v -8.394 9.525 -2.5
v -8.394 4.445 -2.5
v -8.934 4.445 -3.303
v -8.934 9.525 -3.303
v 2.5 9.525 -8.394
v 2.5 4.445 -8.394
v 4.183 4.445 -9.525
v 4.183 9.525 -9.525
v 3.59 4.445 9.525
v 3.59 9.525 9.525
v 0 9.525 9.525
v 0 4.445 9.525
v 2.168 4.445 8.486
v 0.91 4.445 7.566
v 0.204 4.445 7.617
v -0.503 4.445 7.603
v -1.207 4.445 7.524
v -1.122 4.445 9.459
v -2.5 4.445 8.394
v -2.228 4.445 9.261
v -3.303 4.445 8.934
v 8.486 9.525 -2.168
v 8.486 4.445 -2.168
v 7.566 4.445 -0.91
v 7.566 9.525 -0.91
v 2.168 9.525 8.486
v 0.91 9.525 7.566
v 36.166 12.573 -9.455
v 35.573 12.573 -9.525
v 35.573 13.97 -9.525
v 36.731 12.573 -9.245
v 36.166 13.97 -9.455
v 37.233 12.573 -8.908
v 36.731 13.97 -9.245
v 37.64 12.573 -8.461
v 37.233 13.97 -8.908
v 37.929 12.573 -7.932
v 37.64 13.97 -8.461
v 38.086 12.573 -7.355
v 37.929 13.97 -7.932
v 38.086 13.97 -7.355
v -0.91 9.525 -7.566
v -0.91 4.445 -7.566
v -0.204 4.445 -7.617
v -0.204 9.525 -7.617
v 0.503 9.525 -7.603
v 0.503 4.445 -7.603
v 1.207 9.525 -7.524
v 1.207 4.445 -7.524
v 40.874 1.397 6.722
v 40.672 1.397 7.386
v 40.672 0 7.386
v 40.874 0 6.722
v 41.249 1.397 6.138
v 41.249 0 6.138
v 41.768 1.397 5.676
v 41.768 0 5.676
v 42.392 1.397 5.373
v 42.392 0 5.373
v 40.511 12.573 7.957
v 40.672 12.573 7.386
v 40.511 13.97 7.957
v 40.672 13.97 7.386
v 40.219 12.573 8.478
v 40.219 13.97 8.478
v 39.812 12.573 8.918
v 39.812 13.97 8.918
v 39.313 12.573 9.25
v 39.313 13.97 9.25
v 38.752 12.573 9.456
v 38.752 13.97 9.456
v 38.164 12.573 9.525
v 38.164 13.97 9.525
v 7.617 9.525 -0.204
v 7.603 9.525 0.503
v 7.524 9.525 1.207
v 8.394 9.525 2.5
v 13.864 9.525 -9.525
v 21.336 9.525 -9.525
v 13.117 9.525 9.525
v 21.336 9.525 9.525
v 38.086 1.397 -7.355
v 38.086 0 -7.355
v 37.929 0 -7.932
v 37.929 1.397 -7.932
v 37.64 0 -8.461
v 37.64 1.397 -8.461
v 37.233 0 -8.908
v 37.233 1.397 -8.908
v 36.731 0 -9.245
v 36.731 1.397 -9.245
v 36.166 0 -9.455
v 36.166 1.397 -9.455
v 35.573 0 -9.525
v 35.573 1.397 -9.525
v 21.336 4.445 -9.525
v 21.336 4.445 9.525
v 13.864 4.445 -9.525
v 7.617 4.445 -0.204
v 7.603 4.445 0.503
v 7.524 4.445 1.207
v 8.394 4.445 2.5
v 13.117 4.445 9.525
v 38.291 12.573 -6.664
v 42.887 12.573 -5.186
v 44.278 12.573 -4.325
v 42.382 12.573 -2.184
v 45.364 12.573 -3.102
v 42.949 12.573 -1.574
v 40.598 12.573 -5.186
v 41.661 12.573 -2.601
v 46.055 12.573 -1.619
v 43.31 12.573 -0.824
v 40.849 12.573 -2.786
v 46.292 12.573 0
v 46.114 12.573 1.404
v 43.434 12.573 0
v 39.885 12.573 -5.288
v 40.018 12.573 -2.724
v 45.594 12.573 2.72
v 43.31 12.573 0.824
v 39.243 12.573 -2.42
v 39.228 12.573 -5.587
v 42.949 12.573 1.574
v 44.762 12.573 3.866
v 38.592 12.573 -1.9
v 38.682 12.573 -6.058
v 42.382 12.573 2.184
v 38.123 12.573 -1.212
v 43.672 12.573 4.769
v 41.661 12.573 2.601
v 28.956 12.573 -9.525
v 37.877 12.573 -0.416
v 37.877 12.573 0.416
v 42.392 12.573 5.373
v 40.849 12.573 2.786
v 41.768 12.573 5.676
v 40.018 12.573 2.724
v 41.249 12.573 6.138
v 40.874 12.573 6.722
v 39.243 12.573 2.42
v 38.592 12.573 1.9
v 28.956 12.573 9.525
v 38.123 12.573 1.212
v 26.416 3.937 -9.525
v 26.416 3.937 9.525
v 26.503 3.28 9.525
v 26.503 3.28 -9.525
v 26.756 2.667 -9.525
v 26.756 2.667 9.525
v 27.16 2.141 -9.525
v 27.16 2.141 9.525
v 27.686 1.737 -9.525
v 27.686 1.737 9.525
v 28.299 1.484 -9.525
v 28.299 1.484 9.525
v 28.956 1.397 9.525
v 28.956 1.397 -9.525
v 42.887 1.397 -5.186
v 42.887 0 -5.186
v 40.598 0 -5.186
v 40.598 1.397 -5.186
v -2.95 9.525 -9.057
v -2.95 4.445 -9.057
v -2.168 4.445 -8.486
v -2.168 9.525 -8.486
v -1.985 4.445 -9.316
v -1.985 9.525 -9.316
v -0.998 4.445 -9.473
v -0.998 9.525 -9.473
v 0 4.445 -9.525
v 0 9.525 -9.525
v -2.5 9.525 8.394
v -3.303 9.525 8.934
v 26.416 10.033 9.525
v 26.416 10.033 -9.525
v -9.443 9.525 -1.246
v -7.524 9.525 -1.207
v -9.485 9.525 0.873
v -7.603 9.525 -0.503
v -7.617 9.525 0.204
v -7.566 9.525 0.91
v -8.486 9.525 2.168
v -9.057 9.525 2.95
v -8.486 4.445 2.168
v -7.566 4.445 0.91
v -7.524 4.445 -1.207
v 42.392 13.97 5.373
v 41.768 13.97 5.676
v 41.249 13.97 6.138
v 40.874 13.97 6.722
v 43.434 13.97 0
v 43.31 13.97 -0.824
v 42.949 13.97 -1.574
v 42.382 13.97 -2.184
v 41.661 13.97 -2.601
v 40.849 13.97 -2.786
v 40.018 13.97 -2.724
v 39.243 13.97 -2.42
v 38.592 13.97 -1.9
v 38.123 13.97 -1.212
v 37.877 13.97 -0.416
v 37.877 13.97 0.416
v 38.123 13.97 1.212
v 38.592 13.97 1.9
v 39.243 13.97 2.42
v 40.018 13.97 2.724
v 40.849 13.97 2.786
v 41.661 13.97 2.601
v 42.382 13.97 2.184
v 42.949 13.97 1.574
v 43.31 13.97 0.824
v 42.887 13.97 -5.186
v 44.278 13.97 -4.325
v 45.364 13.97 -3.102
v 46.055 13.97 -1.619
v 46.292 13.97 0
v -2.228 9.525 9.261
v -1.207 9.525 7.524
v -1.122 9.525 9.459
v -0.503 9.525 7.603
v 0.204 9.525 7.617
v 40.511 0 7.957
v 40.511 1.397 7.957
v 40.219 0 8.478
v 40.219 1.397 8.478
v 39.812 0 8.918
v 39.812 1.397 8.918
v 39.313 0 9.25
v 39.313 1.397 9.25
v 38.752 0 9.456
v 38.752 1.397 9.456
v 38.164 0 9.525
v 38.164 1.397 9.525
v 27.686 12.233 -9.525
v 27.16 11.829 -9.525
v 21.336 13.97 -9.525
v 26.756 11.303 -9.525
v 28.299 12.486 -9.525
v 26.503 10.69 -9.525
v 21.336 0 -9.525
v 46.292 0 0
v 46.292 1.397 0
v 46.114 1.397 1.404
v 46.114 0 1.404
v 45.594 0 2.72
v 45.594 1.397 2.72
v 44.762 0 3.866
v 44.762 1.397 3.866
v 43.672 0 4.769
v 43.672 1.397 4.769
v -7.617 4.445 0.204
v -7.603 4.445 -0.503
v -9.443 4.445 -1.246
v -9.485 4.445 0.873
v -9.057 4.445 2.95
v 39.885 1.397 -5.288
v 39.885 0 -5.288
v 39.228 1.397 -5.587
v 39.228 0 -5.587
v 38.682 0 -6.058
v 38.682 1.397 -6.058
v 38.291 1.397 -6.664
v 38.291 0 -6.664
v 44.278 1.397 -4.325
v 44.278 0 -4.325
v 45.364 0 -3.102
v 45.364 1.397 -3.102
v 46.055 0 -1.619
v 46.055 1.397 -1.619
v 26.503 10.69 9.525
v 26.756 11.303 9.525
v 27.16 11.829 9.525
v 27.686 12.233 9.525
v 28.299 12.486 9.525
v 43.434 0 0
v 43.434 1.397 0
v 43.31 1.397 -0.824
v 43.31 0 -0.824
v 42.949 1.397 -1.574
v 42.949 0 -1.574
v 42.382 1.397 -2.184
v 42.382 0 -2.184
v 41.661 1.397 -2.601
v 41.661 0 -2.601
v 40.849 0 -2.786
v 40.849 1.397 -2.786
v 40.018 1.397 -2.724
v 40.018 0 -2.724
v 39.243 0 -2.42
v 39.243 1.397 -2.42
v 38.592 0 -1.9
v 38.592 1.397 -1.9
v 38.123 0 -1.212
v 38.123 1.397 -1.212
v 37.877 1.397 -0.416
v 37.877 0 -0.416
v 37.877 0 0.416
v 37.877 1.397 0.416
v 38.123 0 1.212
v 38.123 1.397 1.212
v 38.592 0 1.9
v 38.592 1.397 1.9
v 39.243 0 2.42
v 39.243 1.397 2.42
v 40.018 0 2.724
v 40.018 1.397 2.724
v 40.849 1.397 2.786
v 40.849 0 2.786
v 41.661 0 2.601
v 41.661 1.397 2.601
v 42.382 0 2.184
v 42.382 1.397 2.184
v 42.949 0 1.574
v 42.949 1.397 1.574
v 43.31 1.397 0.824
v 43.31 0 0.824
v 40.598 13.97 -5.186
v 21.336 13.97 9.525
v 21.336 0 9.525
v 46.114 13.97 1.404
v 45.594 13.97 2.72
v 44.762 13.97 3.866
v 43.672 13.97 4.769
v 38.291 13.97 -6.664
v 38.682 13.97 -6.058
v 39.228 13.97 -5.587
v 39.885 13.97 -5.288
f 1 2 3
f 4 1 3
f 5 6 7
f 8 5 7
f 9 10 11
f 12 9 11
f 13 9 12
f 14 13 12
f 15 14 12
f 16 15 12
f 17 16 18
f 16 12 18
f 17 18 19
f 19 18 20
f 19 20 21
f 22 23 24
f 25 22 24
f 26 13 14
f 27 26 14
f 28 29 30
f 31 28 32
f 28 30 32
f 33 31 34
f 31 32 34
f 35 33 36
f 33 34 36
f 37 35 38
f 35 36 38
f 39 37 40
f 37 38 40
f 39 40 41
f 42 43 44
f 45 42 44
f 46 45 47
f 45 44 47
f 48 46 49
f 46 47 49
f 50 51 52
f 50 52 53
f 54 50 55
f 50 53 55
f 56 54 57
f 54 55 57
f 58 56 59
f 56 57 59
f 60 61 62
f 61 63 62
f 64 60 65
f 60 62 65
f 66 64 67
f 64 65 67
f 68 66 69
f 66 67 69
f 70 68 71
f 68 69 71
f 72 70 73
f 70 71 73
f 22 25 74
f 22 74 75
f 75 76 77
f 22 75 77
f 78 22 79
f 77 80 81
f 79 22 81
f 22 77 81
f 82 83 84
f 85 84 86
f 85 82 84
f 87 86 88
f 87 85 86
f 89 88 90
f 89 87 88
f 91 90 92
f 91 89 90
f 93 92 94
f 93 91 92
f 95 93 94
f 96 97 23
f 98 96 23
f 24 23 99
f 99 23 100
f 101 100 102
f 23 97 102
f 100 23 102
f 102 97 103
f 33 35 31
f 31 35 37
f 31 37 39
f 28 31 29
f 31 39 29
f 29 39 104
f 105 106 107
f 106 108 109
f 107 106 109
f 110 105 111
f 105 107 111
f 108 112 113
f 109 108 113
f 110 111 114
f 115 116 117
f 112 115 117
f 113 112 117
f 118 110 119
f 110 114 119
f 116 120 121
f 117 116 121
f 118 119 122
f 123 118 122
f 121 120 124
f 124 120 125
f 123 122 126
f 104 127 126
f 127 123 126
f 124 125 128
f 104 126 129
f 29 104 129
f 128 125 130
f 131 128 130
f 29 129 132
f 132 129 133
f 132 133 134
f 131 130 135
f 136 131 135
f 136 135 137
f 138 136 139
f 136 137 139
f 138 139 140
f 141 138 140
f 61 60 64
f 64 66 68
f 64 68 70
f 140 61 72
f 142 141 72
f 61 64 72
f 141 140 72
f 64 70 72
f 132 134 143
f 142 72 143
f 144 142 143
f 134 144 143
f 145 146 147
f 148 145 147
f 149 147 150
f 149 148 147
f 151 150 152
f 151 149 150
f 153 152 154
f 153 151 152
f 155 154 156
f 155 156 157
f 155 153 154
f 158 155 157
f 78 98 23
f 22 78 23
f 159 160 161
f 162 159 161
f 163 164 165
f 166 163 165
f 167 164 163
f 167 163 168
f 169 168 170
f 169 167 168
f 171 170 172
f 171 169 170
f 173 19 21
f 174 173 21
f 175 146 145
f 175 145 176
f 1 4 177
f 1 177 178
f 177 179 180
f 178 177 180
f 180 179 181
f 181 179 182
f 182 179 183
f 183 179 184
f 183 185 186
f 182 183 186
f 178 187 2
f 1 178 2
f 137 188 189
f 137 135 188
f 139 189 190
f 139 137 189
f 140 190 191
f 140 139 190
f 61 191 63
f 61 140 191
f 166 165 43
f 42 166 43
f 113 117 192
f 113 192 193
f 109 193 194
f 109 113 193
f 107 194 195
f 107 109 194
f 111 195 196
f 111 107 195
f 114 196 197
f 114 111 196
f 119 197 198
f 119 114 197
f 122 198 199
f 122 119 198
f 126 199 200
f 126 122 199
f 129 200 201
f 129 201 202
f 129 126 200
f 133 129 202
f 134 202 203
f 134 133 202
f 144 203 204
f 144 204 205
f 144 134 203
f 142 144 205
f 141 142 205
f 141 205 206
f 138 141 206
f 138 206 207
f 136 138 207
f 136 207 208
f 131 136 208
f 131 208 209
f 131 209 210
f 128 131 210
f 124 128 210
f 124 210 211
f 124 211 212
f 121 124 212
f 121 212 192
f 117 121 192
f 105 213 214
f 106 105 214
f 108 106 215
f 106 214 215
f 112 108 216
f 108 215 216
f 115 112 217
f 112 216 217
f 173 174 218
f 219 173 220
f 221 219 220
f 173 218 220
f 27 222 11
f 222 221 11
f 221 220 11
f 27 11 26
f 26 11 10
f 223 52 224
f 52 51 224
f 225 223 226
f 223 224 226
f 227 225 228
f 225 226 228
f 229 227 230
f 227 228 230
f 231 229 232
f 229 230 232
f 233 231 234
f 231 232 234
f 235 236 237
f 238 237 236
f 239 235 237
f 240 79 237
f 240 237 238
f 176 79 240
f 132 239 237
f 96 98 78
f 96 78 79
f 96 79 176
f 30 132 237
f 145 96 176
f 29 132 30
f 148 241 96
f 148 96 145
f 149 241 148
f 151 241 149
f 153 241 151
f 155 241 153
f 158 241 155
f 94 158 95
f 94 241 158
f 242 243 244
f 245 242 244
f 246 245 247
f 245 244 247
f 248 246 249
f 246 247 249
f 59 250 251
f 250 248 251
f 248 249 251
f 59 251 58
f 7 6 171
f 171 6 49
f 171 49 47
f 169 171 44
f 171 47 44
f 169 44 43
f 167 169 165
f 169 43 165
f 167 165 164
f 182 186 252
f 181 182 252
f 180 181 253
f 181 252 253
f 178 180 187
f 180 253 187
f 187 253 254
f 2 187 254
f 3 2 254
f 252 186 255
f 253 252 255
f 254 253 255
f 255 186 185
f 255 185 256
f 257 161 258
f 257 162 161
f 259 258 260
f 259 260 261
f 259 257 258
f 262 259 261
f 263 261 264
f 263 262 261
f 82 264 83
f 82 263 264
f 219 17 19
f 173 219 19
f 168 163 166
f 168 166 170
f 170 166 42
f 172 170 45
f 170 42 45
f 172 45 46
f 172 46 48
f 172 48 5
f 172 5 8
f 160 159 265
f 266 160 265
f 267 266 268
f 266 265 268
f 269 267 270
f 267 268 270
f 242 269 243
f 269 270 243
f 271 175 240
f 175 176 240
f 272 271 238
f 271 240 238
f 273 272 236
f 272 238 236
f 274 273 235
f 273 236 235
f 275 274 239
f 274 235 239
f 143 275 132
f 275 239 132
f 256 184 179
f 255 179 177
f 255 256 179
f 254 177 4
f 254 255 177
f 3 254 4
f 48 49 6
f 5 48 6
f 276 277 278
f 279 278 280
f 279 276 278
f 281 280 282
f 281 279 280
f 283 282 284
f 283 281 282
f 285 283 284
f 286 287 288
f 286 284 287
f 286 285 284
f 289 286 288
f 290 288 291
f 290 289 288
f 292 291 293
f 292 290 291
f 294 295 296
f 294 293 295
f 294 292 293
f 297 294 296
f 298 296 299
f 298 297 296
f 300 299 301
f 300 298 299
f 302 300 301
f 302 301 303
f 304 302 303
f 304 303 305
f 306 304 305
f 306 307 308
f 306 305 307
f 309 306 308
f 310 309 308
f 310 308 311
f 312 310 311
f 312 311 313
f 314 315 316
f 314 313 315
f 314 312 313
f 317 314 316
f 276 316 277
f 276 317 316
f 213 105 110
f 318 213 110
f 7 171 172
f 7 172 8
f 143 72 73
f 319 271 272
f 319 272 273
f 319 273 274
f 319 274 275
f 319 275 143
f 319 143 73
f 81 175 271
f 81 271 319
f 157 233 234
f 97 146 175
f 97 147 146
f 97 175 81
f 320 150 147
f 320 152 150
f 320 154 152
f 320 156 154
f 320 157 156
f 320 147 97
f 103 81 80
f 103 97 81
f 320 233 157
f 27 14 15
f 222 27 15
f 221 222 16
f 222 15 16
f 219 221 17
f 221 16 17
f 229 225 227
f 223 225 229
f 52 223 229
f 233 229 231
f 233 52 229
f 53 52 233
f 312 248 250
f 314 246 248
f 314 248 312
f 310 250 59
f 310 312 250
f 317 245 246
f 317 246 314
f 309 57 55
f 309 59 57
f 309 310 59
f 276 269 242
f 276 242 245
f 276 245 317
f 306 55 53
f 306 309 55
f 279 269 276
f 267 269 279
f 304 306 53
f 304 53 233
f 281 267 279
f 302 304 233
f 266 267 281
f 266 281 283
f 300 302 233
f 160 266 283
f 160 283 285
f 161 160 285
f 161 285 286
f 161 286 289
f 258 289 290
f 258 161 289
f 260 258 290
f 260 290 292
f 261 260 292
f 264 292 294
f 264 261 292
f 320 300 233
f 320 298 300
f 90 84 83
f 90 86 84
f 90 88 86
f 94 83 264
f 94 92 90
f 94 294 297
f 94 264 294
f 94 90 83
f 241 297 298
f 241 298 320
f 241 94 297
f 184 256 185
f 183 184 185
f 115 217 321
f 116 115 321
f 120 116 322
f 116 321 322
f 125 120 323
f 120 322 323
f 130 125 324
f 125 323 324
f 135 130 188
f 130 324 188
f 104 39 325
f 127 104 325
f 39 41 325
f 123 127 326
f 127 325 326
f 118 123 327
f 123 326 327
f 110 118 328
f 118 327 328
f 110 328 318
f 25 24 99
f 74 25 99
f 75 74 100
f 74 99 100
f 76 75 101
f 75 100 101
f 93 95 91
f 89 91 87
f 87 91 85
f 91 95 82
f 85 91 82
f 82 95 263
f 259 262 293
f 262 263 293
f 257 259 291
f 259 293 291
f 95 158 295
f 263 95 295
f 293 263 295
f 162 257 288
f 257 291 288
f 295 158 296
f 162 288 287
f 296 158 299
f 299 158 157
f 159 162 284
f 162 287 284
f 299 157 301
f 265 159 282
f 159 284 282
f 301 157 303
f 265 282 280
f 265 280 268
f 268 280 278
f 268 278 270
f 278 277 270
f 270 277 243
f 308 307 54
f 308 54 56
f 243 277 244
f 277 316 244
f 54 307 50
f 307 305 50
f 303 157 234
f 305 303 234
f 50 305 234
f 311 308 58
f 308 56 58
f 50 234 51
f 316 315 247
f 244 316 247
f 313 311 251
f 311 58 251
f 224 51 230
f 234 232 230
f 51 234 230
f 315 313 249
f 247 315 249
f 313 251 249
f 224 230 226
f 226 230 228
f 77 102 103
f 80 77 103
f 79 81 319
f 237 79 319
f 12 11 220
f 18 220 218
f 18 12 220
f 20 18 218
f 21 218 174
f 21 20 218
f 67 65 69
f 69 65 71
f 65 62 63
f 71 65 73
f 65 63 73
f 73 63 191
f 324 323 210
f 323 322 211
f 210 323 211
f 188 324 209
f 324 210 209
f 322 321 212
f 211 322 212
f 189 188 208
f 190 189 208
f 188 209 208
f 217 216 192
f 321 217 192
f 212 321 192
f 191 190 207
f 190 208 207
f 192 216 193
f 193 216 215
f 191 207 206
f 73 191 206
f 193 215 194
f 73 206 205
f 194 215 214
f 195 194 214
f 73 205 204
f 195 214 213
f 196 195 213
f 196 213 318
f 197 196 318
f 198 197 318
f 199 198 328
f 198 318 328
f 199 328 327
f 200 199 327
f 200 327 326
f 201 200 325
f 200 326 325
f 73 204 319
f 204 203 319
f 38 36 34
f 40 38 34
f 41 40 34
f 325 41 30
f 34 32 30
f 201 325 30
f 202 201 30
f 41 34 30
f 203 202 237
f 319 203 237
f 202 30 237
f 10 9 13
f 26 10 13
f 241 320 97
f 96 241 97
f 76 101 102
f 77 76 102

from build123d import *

# Parameters (mm, degrees)
SKETCH1_R           = 3.175
SKETCH1_R_2         = 2.794
BOSS_EXTRUDE1_DEPTH = 13.97
SKETCH4_W           = 16.540015352
SKETCH4_H           = 11.176
SKETCH4_W_2         = 14.224
SKETCH4_W_3         = 21.336
SKETCH4_H_2         = 4.445
SKETCH4_W_4         = 9.525
CUT_EXTRUDE1_DEPTH  = 20.05
SKETCH5_W           = 19.401373877
SKETCH5_H           = 12.180650093
CUT_EXTRUDE2_DEPTH  = 14.97
CUT_EXTRUDE3_DEPTH  = 14.97
FILLET1_R           = 2.54
FILLET2_R           = 2.54
FILLET3_R           = 2.54
FILLET4_R           = 2.54
FILLET5_R           = 2.54
FILLET6_R           = 2.54
SKETCH7_R           = 7.62
SKETCH7_R_2         = 4.572
SKETCH7_R_3         = 3.175
CUT_EXTRUDE4_DEPTH  = 5.08
FILLET7_R           = 2.54
FILLET8_R           = 2.54


with BuildPart() as part:
    # Sketch1 → Boss-Extrude1 (new body)
    with BuildSketch(Plane(origin=(0, 0, 0), x_dir=(1, 0, 0), z_dir=(0, 1, 0))):
        with BuildLine():
            Line((0, 9.525), (40.64, 9.525))
            ThreePointArc((40.64, 9.525), (50.165, 0), (40.64, -9.525))
            Line((40.64, -9.525), (0, -9.525))
            ThreePointArc((0, -9.525), (-9.525, 0), (0, 9.525))
        make_face()
        Circle(SKETCH1_R, mode=Mode.SUBTRACT)
        with Locations((40.64, 0)):
            Circle(SKETCH1_R_2, mode=Mode.SUBTRACT)
    extrude(amount=BOSS_EXTRUDE1_DEPTH)

    # Sketch4 → Cut-Extrude1 (cut, through all)
    with BuildSketch(Plane.XY.offset(9.525)):
        with Locations((48.910007676, 6.985)):
            Rectangle(SKETCH4_W, SKETCH4_H)
        with Locations((33.528, 6.985)):
            Rectangle(SKETCH4_W_2, SKETCH4_H)
        with Locations((10.668, 2.2225)):
            Rectangle(SKETCH4_W_3, SKETCH4_H_2)
        with Locations((-4.7625, 2.2225)):
            Rectangle(SKETCH4_W_4, SKETCH4_H_2)
        with Locations((10.668, 11.7475)):
            Rectangle(SKETCH4_W_3, SKETCH4_H_2)
        with Locations((-4.7625, 11.7475)):
            Rectangle(SKETCH4_W_4, SKETCH4_H_2)
    extrude(amount=-CUT_EXTRUDE1_DEPTH, mode=Mode.SUBTRACT)

    # Sketch5 → Cut-Extrude2 (cut, through all)
    with BuildSketch(Plane(origin=(0, 0, 0), x_dir=(-1, 0, 0), z_dir=(0, -1, 0))):
        with Locations((-47.75918095, 11.276013422)):
            Rectangle(SKETCH5_W, SKETCH5_H)
    extrude(amount=-CUT_EXTRUDE2_DEPTH, mode=Mode.SUBTRACT)

    # Sketch6 → Cut-Extrude3 (cut, through all)
    with BuildSketch(Plane(origin=(0, 13.97, 0), x_dir=(1, 0, 0), z_dir=(0, 1, 0))):
        with BuildLine():
            ThreePointArc((46.2915, 0), (44.636213974, -3.996213974), (40.64, -5.6515))
            Line((40.64, -5.6515), (40.64, -9.525))
            ThreePointArc((40.64, -9.525), (49.010164478, -4.545984119), (48.629634602, 5.185688375))
            Line((48.629634602, 5.185688375), (42.886795123, 5.185688375))
            ThreePointArc((42.886795123, 5.185688375), (45.364257343, 3.101748669), (46.2915, 0))
        make_face()
    extrude(amount=-CUT_EXTRUDE3_DEPTH, mode=Mode.SUBTRACT)

    # Fillet1
    fillet1_edges = [part.edges().sort_by_distance(p)[0] for p in [
        (40.64, 13.2715, 5.6515),
    ]]
    fillet(fillet1_edges, radius=FILLET1_R)

    # Fillet2
    fillet2_edges = [part.edges().sort_by_distance(p)[0] for p in [
        (40.64, 13.2715, 9.525),
    ]]
    fillet(fillet2_edges, radius=FILLET2_R)

    # Fillet3
    fillet3_edges = [part.edges().sort_by_distance(p)[0] for p in [
        (40.64, 0.6985, 5.6515),
    ]]
    fillet(fillet3_edges, radius=FILLET3_R)

    # Fillet4
    fillet4_edges = [part.edges().sort_by_distance(p)[0] for p in [
        (40.64, 0.6985, 9.525),
    ]]
    fillet(fillet4_edges, radius=FILLET4_R)

    # Fillet5
    fillet5_edges = [part.edges().sort_by_distance(p)[0] for p in [
        (38.058494011, 0.6985, -5.185688375),
        (38.058494011, 13.2715, -5.185688375),
    ]]
    fillet(fillet5_edges, radius=FILLET5_R)

    # Fillet6
    fillet6_edges = [part.edges().sort_by_distance(p)[0] for p in [
        (38.058494011, 0.6985, -9.525),
        (38.058494011, 13.2715, -9.525),
    ]]
    fillet(fillet6_edges, radius=FILLET6_R)

    # Sketch7 → Cut-Extrude4 (cut)
    with BuildSketch(Plane.XZ.offset(-4.445)):
        Circle(SKETCH7_R)
        Circle(SKETCH7_R_2, mode=Mode.SUBTRACT)
        Circle(SKETCH7_R_2)
        Circle(SKETCH7_R_3, mode=Mode.SUBTRACT)
        with BuildLine():
            Line((2.168350381, 8.48573984), (0.909617415, 7.565513608))
            ThreePointArc((0.909617415, 7.565513608), (5.281112414, 5.493109472), (7.523875786, 1.206521096))
            Line((7.523875786, 1.206521096), (8.393874448, 2.500479103))
            Line((8.393874448, 2.500479103), (13.116843625, 9.525))
            Line((13.116843625, 9.525), (3.589904102, 9.525))
            Line((3.589904102, 9.525), (2.168350381, 8.48573984))
        make_face()
        with BuildLine():
            Line((8.48573984, -2.168350381), (7.565513608, -0.909617415))
            ThreePointArc((7.565513608, -0.909617415), (5.493109472, -5.281112414), (1.206521096, -7.523875786))
            Line((1.206521096, -7.523875786), (2.500479103, -8.393874448))
            Line((2.500479103, -8.393874448), (4.182813833, -9.525))
            Line((4.182813833, -9.525), (13.863990937, -9.525))
            Line((13.863990937, -9.525), (8.48573984, -2.168350381))
        make_face()
        with BuildLine():
            Line((-8.393874448, -2.500479103), (-8.933786454, -3.303495813))
            ThreePointArc((-8.933786454, -3.303495813), (-6.601390518, -6.866386839), (-2.949506801, -9.056822546))
            Line((-2.949506801, -9.056822546), (-2.168350381, -8.48573984))
            Line((-2.168350381, -8.48573984), (-0.909617415, -7.565513608))
            ThreePointArc((-0.909617415, -7.565513608), (-5.281112414, -5.493109472), (-7.523875786, -1.206521096))
            Line((-7.523875786, -1.206521096), (-8.393874448, -2.500479103))
        make_face()
        with BuildLine():
            Line((-1.206521096, 7.523875786), (-2.500479103, 8.393874448))
            Line((-2.500479103, 8.393874448), (-3.303495813, 8.933786454))
            ThreePointArc((-3.303495813, 8.933786454), (-6.866386839, 6.601390518), (-9.056822546, 2.949506801))
            Line((-9.056822546, 2.949506801), (-8.48573984, 2.168350381))
            Line((-8.48573984, 2.168350381), (-7.565513608, 0.909617415))
            ThreePointArc((-7.565513608, 0.909617415), (-5.493109472, 5.281112414), (-1.206521096, 7.523875786))
        make_face()
    extrude(amount=-CUT_EXTRUDE4_DEPTH, mode=Mode.SUBTRACT)

    # Fillet7
    fillet7_edges = [part.edges().sort_by_distance(p)[0] for p in [
        (26.416, 12.573, 0),
    ]]
    fillet(fillet7_edges, radius=FILLET7_R)

    # Fillet8
    fillet8_edges = [part.edges().sort_by_distance(p)[0] for p in [
        (26.416, 1.397, 0),
    ]]
    fillet(fillet8_edges, radius=FILLET8_R)


solid = part.part
